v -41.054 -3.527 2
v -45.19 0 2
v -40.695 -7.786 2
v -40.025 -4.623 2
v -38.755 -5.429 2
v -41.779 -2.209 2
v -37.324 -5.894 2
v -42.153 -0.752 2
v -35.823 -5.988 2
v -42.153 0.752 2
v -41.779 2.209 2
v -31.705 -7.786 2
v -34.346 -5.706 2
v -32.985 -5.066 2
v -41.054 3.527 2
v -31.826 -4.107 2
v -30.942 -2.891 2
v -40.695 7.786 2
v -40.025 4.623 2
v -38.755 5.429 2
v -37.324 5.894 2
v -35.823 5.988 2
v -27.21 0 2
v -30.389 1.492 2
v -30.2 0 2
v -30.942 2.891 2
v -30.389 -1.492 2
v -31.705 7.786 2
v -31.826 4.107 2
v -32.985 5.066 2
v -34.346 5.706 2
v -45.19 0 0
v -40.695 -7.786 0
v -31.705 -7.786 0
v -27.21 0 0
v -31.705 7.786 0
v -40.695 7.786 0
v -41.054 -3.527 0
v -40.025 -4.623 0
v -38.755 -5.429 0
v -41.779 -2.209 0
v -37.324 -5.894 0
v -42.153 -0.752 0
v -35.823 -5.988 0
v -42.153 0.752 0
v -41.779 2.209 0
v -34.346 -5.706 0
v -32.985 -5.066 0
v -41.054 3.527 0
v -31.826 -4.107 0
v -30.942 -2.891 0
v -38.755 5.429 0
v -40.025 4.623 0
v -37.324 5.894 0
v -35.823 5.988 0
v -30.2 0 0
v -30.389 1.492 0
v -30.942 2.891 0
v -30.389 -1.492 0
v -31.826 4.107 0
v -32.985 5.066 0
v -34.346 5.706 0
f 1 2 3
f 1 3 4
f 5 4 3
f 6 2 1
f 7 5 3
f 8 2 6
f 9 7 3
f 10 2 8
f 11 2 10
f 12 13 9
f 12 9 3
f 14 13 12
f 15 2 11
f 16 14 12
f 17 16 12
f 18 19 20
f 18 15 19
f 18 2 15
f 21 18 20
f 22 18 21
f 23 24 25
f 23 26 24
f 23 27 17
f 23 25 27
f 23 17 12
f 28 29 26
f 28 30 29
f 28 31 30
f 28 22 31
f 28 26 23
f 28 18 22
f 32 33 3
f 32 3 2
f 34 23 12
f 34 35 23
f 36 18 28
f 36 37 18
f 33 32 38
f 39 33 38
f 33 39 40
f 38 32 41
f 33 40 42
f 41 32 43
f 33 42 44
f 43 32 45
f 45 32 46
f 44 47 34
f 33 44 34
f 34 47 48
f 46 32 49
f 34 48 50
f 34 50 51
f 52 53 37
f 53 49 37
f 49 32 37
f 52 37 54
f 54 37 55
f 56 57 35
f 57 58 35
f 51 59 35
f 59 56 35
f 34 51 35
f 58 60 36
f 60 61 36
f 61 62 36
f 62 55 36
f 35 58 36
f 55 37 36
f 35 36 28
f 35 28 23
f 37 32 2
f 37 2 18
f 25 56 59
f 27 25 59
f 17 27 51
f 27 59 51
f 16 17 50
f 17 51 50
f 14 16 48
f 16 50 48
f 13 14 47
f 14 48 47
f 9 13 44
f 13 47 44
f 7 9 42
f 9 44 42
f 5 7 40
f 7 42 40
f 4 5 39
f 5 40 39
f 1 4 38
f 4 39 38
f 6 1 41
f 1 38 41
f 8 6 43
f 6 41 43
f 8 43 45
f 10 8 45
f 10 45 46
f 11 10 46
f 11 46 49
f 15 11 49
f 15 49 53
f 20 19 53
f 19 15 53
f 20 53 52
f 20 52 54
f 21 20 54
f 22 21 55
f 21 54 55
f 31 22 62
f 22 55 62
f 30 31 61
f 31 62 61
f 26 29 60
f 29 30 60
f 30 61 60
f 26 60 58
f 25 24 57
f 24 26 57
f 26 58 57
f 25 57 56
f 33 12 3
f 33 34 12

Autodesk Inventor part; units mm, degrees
ref_plane "YZ Plane" through (0, 0, 0) normal (1, 0, 0) x (0, 1, 0)
ref_plane "XZ Plane" through (0, 0, 0) normal (0, 1, 0) x (-1, 0, 0)
ref_plane "XY Plane" through (0, 0, 0) normal (0, 0, 1) x (1, 0, 0)
sketch "Sketch1" plane through (0, 0, 0) normal (0, 0, 1) x (1, 0, 0)
  circle A0 centre (-36.2, 0) radius 6 projected
  circle A1 centre (-36.2, 0) radius 6
  line L0 (-27.2099, 0) -> (-31.705, -7.7856)
  line L1 (-31.705, -7.7856) -> (-40.695, -7.7856)
  line L2 (-40.695, -7.7856) -> (-45.1901, 0)
  line L3 (-45.1901, 0) -> (-40.695, 7.7856)
  line L4 (-40.695, 7.7856) -> (-31.705, 7.7856)
  line L5 (-31.705, 7.7856) -> (-27.2099, 0)
  point P0 (0, 0)
extrude "Extrusion1" add sketch "Sketch1" along normal blind 2
properties part number "NKK_S1AL_mother" material "Stainless Steel"
